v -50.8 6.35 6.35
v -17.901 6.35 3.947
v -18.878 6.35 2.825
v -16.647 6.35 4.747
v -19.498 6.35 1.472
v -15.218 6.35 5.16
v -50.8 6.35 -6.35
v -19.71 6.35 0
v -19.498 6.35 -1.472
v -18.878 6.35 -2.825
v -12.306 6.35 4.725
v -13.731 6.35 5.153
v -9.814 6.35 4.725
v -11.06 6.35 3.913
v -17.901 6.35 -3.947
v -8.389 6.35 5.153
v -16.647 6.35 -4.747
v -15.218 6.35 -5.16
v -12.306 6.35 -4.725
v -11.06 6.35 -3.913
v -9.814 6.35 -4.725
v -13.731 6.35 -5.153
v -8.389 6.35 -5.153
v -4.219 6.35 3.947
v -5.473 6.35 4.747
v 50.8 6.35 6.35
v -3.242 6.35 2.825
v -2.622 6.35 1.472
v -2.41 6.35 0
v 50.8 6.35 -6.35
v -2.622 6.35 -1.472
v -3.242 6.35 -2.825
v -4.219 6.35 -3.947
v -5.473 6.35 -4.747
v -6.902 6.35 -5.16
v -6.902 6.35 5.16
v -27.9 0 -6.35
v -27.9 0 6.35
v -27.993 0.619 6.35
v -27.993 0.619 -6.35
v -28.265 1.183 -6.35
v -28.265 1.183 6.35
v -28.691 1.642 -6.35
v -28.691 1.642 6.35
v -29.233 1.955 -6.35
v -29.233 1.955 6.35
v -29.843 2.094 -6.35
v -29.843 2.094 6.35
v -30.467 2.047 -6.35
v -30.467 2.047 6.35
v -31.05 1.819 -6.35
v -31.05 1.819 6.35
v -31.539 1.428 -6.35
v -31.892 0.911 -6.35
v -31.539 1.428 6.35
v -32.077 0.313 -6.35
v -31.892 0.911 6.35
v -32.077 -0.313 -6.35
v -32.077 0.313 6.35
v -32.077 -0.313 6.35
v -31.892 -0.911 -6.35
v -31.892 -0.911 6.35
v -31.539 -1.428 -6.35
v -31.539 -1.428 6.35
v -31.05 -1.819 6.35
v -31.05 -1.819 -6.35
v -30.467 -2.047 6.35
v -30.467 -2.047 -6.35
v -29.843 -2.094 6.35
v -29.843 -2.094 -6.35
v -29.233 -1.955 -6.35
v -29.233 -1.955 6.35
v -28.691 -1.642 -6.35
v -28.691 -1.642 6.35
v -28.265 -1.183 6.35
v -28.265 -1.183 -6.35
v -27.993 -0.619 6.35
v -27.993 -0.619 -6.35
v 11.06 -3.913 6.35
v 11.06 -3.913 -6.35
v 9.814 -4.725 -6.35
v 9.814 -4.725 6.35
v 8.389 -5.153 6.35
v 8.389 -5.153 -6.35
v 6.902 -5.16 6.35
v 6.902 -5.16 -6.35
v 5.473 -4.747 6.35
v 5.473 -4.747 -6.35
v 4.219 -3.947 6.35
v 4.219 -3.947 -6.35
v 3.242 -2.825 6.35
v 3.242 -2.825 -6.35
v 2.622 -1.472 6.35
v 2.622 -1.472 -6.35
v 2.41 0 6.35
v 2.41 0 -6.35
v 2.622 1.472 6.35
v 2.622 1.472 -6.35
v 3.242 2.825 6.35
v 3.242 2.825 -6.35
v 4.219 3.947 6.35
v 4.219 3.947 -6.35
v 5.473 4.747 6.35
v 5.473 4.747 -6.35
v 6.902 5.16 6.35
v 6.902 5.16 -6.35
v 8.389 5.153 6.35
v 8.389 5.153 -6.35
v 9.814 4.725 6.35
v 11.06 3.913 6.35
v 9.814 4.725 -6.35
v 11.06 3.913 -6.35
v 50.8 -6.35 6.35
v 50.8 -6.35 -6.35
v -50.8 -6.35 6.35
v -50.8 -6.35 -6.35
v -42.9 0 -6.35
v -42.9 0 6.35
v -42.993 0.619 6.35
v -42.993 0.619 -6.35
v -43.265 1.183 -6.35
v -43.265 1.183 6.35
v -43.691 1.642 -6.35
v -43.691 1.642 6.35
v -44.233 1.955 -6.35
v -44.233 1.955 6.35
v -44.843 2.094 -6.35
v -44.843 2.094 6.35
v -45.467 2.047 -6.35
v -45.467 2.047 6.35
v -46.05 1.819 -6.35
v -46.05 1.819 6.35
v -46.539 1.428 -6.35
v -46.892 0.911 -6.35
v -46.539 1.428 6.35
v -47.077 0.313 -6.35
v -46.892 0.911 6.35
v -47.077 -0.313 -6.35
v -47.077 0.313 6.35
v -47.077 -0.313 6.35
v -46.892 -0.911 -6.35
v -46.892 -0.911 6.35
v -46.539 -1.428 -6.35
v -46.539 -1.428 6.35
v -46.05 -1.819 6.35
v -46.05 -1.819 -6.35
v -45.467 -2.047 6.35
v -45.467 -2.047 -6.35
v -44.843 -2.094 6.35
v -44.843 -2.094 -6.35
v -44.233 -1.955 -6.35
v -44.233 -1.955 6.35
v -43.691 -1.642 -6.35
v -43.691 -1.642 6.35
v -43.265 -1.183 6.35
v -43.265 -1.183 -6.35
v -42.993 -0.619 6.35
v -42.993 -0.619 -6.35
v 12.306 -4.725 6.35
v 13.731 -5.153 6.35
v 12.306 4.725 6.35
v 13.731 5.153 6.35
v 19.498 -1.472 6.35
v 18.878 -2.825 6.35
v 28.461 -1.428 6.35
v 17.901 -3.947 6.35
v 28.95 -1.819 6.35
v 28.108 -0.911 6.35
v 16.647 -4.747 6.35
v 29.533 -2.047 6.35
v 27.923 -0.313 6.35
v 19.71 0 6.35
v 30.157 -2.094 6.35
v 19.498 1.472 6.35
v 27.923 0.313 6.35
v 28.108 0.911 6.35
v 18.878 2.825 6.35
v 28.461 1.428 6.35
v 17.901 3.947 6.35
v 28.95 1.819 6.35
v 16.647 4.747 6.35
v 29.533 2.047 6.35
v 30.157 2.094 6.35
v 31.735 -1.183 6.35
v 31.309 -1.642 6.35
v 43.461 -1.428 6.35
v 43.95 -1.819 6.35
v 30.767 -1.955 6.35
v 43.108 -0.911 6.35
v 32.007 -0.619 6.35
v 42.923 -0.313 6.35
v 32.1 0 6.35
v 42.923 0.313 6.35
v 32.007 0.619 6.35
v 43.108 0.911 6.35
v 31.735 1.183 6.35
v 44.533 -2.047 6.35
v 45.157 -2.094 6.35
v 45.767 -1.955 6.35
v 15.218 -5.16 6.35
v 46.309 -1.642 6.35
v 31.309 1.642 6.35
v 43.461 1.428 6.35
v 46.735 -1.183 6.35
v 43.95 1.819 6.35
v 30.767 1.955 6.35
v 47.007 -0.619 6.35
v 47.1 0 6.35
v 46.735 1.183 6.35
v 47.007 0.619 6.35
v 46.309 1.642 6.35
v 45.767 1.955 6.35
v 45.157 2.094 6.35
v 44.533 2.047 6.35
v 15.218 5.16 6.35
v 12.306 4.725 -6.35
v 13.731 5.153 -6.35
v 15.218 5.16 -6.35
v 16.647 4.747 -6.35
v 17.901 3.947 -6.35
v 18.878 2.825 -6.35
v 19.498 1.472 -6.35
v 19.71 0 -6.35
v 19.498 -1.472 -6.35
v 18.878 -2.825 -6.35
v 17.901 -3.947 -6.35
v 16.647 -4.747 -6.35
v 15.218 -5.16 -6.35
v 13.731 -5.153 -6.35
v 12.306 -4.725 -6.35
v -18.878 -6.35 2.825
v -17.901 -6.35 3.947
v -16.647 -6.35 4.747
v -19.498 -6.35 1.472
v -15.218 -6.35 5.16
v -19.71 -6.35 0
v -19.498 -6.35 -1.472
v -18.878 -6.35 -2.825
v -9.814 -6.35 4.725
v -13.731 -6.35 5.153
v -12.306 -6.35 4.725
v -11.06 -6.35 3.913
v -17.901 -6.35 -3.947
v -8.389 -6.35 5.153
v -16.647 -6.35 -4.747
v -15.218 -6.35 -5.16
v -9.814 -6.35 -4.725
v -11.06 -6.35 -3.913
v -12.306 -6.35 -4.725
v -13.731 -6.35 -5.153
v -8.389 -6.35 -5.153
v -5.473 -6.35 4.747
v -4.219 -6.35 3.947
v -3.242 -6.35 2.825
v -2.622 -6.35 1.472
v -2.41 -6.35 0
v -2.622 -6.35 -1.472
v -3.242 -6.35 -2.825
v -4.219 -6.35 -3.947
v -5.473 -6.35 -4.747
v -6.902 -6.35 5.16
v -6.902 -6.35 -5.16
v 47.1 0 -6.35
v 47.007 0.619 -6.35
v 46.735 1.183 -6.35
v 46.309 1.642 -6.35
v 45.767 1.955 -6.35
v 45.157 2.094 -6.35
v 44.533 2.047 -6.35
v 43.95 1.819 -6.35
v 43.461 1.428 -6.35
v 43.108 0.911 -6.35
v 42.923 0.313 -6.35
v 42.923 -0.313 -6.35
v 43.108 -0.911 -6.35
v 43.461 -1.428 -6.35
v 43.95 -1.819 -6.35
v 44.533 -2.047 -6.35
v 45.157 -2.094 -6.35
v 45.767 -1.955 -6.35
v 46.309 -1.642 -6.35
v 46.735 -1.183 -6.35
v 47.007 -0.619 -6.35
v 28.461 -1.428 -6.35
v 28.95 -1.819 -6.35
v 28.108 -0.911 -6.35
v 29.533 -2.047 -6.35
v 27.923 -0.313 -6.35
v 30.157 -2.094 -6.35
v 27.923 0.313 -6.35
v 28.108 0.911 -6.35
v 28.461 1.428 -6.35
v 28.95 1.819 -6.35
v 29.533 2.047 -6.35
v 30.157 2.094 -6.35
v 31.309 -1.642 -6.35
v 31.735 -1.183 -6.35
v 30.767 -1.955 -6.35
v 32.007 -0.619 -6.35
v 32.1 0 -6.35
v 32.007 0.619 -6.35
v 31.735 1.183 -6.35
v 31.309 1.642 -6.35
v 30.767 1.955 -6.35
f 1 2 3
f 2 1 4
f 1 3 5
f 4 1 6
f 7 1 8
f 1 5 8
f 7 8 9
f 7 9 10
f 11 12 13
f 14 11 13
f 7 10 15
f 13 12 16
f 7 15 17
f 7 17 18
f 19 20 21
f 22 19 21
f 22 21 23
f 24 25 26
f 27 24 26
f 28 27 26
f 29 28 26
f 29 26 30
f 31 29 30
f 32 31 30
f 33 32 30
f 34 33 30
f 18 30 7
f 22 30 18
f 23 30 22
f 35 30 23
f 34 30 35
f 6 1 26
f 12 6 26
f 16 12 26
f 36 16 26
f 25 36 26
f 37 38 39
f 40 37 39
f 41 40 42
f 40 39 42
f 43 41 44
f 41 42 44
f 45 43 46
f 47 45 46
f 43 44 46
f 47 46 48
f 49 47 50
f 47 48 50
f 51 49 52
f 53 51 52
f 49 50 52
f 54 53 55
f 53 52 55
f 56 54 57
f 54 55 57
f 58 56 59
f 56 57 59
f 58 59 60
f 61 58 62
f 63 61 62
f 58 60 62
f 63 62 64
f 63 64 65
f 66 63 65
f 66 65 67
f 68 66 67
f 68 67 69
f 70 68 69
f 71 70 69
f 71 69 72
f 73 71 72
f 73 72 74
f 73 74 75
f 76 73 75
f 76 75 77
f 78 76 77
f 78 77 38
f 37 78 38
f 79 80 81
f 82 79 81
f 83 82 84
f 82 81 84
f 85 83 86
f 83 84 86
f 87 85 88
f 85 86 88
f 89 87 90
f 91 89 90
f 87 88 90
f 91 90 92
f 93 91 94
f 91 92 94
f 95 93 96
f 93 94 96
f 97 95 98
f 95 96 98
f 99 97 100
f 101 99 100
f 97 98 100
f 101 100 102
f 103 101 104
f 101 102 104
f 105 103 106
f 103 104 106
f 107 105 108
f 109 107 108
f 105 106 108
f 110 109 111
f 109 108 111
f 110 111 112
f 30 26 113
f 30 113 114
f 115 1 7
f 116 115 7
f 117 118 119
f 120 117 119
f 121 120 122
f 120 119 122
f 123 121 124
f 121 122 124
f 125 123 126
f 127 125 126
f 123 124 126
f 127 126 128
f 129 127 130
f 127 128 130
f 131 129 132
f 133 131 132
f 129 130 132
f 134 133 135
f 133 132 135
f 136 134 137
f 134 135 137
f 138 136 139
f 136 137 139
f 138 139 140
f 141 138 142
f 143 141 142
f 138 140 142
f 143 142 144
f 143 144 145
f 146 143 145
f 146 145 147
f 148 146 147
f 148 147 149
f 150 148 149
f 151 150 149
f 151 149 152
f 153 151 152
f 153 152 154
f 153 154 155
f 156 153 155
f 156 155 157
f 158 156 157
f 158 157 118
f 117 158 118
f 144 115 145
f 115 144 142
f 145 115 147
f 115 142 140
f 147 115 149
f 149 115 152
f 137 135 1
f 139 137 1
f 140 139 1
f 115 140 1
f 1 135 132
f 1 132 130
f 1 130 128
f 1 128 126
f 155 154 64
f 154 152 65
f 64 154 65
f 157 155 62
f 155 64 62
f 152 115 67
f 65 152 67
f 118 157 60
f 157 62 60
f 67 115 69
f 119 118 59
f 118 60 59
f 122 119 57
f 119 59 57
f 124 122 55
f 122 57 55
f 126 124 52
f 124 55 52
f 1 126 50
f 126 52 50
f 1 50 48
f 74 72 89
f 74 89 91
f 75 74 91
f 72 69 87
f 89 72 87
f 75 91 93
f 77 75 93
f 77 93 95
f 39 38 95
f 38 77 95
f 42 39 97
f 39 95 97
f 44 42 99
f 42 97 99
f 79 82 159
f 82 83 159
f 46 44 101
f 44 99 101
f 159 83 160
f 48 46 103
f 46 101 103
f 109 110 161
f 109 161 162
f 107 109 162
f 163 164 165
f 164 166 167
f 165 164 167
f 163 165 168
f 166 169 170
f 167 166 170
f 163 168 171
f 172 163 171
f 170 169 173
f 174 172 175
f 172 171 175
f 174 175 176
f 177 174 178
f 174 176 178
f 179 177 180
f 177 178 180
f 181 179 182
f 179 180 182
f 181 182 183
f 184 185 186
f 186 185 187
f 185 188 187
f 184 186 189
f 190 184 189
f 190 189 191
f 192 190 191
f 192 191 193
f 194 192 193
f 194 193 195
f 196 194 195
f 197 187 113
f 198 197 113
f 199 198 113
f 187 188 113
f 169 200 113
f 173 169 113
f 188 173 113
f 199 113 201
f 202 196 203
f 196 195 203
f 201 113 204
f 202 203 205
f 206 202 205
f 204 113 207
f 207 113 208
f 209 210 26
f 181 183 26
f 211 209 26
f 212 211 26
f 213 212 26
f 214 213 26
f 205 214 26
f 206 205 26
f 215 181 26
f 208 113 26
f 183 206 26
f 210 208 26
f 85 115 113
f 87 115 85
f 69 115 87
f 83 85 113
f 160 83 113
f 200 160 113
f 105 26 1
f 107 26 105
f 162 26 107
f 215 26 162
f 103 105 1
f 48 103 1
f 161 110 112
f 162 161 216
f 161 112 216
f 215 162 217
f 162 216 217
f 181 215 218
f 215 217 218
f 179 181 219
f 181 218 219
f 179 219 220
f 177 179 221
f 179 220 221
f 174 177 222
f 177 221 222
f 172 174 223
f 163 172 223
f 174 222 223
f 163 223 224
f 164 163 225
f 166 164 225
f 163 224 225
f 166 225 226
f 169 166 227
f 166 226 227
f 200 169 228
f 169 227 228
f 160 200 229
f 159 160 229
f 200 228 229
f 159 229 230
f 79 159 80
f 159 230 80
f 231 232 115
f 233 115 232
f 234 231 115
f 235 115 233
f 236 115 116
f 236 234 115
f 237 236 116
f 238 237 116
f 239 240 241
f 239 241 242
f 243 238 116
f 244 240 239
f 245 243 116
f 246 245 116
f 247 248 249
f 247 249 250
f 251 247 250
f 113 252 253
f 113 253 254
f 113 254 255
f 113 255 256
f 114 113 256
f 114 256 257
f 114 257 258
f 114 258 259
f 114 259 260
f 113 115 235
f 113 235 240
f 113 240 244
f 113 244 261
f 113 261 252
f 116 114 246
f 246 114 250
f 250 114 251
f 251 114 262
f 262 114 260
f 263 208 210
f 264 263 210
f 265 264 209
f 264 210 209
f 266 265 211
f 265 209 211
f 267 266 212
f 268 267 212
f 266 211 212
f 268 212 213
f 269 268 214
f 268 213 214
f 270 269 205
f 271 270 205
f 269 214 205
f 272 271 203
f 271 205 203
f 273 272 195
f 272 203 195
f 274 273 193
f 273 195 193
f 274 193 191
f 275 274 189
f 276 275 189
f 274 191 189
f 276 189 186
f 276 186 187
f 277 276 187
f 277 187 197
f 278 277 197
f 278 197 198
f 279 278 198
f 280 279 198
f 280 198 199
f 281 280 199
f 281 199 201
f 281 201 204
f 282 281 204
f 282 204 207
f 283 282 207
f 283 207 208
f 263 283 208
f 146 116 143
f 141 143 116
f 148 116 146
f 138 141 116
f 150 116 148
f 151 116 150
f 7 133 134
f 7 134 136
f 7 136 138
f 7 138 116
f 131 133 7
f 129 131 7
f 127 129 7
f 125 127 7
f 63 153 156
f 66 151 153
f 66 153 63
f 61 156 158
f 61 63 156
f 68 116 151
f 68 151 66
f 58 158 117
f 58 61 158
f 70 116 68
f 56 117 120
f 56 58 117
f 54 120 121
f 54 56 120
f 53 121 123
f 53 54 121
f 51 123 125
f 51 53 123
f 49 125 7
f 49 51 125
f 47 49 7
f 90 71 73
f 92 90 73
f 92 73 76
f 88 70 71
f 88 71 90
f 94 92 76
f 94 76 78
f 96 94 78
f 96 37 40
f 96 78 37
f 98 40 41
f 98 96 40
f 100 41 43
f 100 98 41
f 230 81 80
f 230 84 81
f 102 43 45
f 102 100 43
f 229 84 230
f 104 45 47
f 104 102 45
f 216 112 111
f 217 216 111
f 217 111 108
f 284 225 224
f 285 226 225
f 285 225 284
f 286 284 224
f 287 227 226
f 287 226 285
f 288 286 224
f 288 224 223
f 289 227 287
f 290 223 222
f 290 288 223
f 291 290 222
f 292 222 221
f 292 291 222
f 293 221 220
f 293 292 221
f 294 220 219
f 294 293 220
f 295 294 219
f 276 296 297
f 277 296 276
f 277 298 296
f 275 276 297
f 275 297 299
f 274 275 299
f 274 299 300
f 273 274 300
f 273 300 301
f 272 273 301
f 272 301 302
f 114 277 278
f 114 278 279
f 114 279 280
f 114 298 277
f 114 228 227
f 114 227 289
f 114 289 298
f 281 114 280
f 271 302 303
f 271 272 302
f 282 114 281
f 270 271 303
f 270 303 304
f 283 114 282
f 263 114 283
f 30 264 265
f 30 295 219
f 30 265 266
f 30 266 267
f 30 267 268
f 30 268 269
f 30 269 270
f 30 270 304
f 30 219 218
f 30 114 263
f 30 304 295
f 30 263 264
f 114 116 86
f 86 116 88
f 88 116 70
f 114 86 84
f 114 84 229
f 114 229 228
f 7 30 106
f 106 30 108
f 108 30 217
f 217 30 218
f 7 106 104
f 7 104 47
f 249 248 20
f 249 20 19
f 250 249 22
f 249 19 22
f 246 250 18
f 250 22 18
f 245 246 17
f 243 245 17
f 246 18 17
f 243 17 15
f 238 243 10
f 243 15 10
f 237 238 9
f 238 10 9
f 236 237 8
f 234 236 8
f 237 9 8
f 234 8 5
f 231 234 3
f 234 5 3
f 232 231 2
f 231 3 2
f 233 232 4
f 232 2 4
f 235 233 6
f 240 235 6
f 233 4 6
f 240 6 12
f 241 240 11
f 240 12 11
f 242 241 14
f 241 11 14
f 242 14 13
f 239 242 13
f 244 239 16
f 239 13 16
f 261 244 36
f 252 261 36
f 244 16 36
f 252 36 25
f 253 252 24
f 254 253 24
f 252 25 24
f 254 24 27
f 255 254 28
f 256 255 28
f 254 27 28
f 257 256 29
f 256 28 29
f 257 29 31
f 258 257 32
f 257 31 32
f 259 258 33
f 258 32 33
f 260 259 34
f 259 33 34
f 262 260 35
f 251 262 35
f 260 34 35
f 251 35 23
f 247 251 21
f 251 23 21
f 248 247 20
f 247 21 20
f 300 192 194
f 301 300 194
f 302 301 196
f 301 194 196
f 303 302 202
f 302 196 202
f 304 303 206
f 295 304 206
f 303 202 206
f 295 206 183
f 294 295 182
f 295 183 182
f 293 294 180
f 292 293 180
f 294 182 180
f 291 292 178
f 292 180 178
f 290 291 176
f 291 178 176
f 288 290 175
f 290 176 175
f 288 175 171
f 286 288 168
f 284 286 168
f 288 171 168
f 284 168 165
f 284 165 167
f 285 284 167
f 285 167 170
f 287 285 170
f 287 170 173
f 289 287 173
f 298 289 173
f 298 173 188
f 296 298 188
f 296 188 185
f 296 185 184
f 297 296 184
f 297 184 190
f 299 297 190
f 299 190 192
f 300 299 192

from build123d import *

# Parameters (mm, degrees)
SKETCH1_W                 = 12.7
SKETCH1_H                 = 12.7
BOSS_EXTRUDE1_DEPTH       = 50.8
SKETCH2_R                 = 5.21
CUT_EXTRUDE1_DEPTH        = 101.6
SKETCH3_R                 = 5.21
CUT_EXTRUDE2_DEPTH        = 101.6
M5X0_8_TAPPED_HOLE2_D     = 4.2
M5X0_8_TAPPED_HOLE2_DEPTH = 14
M5X0_8_TAPPED_HOLE2_TIP   = 1.2618073


with BuildPart() as part:
    # Sketch1 → Boss-Extrude1 (new, symmetric)
    with BuildSketch(Plane(origin=(0, 0, 0), x_dir=(0, 0, -1), z_dir=(1, 0, 0))):
        Rectangle(SKETCH1_W, SKETCH1_H)
    extrude(amount=BOSS_EXTRUDE1_DEPTH, both=True)

    # Sketch2 → Cut-Extrude1 (cut)
    with BuildSketch(Plane(origin=(0, 6.35, 0), x_dir=(1, 0, 0), z_dir=(0, 1, 0))):
        with Locations((-7.62, 0)):
            Circle(SKETCH2_R)
        with Locations((-14.5, 0)):
            Circle(SKETCH2_R)
    extrude(amount=-CUT_EXTRUDE1_DEPTH, mode=Mode.SUBTRACT)

    # Sketch3 → Cut-Extrude2 (cut)
    with BuildSketch(Plane(origin=(0, 0, -6.35), x_dir=(-1, 0, 0), z_dir=(0, 0, -1))):
        with Locations((-14.5, 0)):
            Circle(SKETCH3_R)
        with Locations((-7.62, 0)):
            Circle(SKETCH3_R)
    extrude(amount=-CUT_EXTRUDE2_DEPTH, mode=Mode.SUBTRACT)

    # M5x0.8 Tapped Hole2
    with Locations(Plane(origin=(0, 0, -6.35), x_dir=(-1, 0, 0), z_dir=(0, 0, -1))):
        with Locations((-45, 0), (-30, 0), (30, 0), (45, 0)):
            Hole(M5X0_8_TAPPED_HOLE2_D / 2, depth=M5X0_8_TAPPED_HOLE2_DEPTH)
            with Locations((0, 0, -(M5X0_8_TAPPED_HOLE2_DEPTH + M5X0_8_TAPPED_HOLE2_TIP / 2))):  # 118° drill point
                Cone(0, M5X0_8_TAPPED_HOLE2_D / 2, M5X0_8_TAPPED_HOLE2_TIP, mode=Mode.SUBTRACT)


solid = part.part
